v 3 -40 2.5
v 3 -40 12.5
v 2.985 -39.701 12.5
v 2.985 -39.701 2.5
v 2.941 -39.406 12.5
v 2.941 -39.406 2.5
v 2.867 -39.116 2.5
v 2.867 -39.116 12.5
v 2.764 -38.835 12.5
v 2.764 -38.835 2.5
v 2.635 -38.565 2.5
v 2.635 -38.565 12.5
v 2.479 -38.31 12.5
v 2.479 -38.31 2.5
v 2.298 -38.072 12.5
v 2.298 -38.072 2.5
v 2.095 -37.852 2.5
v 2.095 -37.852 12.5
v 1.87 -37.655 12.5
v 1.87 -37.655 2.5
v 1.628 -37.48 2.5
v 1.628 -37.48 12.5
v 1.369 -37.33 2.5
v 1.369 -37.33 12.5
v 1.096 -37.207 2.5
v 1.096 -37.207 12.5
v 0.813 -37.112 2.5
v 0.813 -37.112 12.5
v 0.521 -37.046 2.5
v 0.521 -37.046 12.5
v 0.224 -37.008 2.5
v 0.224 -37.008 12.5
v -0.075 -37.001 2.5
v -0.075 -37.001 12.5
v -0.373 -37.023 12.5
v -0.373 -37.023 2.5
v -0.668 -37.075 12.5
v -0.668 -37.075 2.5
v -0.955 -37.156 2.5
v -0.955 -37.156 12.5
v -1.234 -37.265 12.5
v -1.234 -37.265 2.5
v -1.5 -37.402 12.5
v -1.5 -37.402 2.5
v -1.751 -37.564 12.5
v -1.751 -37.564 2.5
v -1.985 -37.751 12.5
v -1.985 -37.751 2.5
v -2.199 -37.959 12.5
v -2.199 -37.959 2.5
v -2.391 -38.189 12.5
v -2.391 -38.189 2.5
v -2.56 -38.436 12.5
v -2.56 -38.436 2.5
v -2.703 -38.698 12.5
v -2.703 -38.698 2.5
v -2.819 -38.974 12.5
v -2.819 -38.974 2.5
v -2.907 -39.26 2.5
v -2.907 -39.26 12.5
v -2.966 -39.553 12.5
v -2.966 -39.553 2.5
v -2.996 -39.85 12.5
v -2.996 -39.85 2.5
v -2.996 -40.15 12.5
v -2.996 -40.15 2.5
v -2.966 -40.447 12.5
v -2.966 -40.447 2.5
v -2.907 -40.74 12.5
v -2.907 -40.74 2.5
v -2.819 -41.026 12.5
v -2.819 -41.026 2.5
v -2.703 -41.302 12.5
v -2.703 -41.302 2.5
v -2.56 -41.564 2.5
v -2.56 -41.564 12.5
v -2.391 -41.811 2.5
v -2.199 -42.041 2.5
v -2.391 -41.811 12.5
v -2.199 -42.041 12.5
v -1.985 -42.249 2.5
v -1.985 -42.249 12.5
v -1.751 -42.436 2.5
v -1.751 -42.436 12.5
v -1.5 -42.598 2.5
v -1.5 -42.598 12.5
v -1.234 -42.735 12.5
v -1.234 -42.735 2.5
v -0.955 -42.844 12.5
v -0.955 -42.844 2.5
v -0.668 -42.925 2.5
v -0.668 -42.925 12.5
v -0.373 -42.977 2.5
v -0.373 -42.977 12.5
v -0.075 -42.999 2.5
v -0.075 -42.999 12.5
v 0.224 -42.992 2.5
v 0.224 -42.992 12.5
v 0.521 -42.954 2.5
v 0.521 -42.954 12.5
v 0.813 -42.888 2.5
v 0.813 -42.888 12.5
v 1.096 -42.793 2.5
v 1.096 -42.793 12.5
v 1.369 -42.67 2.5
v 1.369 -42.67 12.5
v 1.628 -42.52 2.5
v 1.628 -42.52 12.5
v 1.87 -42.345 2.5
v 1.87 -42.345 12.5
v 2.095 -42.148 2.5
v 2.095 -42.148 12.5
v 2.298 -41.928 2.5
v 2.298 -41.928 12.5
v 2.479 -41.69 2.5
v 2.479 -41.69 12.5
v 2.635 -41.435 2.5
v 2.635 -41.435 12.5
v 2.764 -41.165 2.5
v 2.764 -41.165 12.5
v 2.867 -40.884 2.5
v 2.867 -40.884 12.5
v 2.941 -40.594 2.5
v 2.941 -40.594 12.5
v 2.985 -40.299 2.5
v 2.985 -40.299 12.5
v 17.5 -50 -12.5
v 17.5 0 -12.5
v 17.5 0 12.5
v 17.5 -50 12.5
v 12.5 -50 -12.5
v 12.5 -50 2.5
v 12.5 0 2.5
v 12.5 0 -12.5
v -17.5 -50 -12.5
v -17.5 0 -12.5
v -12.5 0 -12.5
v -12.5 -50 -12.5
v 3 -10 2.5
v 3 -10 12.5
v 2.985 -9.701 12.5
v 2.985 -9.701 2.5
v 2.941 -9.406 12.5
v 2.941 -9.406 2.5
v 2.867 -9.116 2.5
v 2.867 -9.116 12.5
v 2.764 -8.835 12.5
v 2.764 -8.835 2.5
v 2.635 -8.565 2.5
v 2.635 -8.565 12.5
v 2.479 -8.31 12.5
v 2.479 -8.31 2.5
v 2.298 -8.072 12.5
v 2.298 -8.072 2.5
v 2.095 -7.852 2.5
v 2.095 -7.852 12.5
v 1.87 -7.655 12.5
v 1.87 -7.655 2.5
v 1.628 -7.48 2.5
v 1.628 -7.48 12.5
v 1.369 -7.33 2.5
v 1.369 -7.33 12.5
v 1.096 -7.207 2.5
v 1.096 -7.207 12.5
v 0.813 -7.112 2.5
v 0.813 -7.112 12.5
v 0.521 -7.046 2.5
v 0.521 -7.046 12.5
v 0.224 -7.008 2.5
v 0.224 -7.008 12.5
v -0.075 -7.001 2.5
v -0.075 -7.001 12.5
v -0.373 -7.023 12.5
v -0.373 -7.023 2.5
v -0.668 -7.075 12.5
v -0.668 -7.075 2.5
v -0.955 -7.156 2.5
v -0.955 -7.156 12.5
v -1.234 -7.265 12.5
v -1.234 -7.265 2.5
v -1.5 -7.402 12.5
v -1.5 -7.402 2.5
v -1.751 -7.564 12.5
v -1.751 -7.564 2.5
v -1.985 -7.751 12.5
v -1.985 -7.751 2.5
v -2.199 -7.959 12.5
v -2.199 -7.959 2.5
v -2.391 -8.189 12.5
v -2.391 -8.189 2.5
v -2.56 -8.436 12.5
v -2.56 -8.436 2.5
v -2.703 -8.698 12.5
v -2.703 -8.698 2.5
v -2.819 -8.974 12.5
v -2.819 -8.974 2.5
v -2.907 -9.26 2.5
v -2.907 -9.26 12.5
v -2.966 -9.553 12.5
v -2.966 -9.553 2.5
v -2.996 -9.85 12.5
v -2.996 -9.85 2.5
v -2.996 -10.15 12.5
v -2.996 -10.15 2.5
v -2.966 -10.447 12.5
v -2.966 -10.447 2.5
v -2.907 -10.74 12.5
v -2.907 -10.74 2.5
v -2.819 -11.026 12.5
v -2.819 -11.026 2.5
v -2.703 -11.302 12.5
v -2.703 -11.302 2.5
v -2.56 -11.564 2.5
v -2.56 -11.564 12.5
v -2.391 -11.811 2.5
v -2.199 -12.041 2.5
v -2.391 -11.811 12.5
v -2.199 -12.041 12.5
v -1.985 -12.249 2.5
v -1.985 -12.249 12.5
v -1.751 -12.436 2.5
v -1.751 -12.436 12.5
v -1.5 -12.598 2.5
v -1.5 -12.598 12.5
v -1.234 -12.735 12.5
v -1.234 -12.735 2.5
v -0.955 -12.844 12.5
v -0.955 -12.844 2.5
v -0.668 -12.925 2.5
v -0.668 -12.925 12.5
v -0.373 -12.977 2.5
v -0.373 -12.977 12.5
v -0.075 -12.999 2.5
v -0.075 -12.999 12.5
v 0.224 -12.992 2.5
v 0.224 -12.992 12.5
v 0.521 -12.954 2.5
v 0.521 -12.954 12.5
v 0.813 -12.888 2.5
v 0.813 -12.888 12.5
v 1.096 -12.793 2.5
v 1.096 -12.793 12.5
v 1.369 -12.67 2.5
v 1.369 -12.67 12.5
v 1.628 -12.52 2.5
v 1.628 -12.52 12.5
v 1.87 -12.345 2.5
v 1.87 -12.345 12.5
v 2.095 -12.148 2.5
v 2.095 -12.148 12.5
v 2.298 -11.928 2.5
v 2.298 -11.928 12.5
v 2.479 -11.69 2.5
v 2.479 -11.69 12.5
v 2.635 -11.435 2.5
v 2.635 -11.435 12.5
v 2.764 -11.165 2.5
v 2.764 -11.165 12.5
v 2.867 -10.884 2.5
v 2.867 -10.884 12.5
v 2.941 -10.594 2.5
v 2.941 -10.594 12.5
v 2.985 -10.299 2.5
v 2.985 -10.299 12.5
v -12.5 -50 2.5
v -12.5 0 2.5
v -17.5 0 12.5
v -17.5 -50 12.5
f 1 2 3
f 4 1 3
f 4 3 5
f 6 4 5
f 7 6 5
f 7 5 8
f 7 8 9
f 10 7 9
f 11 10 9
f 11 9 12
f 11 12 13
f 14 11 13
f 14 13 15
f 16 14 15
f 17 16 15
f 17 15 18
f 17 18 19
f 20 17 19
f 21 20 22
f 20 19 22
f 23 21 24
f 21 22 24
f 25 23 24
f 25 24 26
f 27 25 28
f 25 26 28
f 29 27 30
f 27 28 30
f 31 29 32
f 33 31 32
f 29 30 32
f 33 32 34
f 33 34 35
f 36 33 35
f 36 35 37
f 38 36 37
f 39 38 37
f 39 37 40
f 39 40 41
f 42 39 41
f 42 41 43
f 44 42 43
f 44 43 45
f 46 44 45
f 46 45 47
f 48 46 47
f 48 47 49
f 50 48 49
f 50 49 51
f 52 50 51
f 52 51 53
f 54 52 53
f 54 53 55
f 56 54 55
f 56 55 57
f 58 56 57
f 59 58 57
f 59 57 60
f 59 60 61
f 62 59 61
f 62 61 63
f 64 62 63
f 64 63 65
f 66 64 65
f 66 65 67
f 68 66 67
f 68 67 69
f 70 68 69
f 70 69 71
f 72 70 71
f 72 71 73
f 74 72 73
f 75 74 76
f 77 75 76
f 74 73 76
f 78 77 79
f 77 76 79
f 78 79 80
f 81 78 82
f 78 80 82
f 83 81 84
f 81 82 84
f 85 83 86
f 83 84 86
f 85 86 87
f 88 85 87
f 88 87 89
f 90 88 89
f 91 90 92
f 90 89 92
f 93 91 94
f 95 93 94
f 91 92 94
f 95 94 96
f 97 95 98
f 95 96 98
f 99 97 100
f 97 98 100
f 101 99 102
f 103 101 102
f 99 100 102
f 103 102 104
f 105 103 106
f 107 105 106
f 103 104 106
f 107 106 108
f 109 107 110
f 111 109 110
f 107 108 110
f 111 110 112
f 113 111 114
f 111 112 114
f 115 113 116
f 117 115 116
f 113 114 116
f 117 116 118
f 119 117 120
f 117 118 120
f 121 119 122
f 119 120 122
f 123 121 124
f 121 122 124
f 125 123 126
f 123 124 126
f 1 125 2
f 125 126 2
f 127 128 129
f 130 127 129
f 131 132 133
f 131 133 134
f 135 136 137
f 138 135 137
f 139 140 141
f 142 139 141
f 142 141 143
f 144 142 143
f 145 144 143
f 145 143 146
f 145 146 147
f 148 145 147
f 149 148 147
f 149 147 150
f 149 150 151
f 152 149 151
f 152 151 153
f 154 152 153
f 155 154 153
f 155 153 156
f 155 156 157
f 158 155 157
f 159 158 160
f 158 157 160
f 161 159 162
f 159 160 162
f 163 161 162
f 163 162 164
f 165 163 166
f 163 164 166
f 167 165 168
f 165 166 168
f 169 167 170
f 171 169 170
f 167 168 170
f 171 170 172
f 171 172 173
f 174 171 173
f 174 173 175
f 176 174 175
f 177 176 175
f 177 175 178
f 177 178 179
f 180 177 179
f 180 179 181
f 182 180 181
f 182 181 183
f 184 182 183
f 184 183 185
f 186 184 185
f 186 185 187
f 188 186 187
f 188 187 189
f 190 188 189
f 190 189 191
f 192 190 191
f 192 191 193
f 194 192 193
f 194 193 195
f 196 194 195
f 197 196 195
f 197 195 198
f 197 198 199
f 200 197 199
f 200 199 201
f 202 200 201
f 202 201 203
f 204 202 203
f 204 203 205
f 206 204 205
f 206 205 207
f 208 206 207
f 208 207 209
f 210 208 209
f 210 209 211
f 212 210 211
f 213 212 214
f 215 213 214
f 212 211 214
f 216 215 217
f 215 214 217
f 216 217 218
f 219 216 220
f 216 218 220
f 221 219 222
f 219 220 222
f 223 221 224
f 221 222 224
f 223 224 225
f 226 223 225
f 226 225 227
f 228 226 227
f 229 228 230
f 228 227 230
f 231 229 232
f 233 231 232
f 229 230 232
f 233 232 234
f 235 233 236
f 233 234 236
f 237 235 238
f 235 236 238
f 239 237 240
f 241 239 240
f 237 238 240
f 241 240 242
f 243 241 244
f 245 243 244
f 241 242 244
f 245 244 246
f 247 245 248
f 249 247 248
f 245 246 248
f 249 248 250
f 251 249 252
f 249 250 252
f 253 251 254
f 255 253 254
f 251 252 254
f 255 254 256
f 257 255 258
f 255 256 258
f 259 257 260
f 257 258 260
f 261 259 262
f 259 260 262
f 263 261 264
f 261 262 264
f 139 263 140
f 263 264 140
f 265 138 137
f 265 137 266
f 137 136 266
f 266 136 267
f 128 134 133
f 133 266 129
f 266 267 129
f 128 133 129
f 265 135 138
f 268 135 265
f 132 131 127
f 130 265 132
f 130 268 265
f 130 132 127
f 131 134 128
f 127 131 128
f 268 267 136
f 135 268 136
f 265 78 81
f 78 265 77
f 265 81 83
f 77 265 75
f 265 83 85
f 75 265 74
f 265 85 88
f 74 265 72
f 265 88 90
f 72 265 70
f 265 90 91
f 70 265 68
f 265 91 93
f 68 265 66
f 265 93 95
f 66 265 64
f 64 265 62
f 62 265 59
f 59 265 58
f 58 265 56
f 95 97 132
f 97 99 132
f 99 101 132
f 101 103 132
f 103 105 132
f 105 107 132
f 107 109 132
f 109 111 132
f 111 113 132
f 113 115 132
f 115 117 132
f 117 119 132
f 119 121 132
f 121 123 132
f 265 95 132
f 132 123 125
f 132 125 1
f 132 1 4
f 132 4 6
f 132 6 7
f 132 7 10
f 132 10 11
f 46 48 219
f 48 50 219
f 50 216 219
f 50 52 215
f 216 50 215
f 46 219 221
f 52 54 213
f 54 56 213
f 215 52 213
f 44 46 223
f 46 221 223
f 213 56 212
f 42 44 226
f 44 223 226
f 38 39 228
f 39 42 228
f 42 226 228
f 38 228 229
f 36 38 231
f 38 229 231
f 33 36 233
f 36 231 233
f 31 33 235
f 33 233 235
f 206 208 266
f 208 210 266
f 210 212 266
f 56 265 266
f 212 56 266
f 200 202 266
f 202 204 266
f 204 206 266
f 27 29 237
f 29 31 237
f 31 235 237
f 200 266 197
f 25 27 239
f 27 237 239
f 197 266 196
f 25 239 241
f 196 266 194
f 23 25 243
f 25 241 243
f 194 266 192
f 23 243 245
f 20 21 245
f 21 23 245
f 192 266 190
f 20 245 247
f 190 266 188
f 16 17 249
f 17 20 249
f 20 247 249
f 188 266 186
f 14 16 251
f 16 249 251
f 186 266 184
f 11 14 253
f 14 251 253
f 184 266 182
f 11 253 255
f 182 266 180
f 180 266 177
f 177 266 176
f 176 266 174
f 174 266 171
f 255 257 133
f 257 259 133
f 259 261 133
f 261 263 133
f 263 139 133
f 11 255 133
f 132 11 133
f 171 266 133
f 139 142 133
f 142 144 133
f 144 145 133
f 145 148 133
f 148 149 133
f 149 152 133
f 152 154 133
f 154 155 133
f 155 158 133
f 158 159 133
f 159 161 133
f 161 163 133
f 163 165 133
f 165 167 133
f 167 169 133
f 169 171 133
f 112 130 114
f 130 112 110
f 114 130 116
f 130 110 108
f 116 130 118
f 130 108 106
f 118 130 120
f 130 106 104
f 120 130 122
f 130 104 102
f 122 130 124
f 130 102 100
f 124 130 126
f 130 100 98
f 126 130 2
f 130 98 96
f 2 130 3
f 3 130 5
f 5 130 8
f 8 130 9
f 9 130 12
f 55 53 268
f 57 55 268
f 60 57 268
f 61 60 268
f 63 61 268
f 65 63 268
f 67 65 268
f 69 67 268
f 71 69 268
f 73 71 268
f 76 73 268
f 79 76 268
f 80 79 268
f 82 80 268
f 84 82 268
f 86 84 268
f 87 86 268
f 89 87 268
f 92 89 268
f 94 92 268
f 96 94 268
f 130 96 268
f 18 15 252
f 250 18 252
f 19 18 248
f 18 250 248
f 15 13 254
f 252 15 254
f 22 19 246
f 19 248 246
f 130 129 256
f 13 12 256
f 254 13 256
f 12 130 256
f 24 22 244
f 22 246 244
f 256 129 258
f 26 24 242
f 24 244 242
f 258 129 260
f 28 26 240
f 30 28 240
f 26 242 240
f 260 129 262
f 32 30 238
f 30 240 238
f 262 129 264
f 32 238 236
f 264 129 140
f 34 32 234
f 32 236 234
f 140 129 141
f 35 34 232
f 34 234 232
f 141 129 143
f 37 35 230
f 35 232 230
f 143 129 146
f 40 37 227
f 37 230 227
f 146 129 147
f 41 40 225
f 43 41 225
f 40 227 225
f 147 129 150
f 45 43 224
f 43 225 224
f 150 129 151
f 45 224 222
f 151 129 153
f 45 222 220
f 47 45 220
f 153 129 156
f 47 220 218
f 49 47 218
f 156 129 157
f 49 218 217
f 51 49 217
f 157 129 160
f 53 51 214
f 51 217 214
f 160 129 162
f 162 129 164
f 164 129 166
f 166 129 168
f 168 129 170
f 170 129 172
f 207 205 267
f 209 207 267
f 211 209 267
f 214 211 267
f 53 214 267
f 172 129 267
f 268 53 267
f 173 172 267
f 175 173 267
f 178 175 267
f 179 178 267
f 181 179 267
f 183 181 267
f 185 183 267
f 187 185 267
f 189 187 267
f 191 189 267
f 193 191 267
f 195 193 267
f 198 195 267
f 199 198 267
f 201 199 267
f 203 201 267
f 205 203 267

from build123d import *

# Parameters (mm, degrees)
F1_DEPTH = 50
F2_R     = 3
F3_DEPTH = 25


with BuildPart() as f1:
    # F0 (on Front) → F1 (new body)
    with BuildSketch(Plane.XZ):
        Polygon((-17.5, 12.5), (-17.5, -12.5), (-12.5, -12.5), (-12.5, 2.5), (12.5, 2.5), (12.5, -12.5), (17.5, -12.5), (17.5, 12.5), align=None)
    extrude(amount=F1_DEPTH)

    # F2 (on face) → F3 (cut)
    with BuildSketch(Plane.XY.offset(12.5)):
        with Locations((0, -10)):
            Circle(F2_R)
        with Locations((0, -40)):
            Circle(F2_R)
    extrude(amount=-F3_DEPTH, mode=Mode.SUBTRACT)


solid = f1.part
